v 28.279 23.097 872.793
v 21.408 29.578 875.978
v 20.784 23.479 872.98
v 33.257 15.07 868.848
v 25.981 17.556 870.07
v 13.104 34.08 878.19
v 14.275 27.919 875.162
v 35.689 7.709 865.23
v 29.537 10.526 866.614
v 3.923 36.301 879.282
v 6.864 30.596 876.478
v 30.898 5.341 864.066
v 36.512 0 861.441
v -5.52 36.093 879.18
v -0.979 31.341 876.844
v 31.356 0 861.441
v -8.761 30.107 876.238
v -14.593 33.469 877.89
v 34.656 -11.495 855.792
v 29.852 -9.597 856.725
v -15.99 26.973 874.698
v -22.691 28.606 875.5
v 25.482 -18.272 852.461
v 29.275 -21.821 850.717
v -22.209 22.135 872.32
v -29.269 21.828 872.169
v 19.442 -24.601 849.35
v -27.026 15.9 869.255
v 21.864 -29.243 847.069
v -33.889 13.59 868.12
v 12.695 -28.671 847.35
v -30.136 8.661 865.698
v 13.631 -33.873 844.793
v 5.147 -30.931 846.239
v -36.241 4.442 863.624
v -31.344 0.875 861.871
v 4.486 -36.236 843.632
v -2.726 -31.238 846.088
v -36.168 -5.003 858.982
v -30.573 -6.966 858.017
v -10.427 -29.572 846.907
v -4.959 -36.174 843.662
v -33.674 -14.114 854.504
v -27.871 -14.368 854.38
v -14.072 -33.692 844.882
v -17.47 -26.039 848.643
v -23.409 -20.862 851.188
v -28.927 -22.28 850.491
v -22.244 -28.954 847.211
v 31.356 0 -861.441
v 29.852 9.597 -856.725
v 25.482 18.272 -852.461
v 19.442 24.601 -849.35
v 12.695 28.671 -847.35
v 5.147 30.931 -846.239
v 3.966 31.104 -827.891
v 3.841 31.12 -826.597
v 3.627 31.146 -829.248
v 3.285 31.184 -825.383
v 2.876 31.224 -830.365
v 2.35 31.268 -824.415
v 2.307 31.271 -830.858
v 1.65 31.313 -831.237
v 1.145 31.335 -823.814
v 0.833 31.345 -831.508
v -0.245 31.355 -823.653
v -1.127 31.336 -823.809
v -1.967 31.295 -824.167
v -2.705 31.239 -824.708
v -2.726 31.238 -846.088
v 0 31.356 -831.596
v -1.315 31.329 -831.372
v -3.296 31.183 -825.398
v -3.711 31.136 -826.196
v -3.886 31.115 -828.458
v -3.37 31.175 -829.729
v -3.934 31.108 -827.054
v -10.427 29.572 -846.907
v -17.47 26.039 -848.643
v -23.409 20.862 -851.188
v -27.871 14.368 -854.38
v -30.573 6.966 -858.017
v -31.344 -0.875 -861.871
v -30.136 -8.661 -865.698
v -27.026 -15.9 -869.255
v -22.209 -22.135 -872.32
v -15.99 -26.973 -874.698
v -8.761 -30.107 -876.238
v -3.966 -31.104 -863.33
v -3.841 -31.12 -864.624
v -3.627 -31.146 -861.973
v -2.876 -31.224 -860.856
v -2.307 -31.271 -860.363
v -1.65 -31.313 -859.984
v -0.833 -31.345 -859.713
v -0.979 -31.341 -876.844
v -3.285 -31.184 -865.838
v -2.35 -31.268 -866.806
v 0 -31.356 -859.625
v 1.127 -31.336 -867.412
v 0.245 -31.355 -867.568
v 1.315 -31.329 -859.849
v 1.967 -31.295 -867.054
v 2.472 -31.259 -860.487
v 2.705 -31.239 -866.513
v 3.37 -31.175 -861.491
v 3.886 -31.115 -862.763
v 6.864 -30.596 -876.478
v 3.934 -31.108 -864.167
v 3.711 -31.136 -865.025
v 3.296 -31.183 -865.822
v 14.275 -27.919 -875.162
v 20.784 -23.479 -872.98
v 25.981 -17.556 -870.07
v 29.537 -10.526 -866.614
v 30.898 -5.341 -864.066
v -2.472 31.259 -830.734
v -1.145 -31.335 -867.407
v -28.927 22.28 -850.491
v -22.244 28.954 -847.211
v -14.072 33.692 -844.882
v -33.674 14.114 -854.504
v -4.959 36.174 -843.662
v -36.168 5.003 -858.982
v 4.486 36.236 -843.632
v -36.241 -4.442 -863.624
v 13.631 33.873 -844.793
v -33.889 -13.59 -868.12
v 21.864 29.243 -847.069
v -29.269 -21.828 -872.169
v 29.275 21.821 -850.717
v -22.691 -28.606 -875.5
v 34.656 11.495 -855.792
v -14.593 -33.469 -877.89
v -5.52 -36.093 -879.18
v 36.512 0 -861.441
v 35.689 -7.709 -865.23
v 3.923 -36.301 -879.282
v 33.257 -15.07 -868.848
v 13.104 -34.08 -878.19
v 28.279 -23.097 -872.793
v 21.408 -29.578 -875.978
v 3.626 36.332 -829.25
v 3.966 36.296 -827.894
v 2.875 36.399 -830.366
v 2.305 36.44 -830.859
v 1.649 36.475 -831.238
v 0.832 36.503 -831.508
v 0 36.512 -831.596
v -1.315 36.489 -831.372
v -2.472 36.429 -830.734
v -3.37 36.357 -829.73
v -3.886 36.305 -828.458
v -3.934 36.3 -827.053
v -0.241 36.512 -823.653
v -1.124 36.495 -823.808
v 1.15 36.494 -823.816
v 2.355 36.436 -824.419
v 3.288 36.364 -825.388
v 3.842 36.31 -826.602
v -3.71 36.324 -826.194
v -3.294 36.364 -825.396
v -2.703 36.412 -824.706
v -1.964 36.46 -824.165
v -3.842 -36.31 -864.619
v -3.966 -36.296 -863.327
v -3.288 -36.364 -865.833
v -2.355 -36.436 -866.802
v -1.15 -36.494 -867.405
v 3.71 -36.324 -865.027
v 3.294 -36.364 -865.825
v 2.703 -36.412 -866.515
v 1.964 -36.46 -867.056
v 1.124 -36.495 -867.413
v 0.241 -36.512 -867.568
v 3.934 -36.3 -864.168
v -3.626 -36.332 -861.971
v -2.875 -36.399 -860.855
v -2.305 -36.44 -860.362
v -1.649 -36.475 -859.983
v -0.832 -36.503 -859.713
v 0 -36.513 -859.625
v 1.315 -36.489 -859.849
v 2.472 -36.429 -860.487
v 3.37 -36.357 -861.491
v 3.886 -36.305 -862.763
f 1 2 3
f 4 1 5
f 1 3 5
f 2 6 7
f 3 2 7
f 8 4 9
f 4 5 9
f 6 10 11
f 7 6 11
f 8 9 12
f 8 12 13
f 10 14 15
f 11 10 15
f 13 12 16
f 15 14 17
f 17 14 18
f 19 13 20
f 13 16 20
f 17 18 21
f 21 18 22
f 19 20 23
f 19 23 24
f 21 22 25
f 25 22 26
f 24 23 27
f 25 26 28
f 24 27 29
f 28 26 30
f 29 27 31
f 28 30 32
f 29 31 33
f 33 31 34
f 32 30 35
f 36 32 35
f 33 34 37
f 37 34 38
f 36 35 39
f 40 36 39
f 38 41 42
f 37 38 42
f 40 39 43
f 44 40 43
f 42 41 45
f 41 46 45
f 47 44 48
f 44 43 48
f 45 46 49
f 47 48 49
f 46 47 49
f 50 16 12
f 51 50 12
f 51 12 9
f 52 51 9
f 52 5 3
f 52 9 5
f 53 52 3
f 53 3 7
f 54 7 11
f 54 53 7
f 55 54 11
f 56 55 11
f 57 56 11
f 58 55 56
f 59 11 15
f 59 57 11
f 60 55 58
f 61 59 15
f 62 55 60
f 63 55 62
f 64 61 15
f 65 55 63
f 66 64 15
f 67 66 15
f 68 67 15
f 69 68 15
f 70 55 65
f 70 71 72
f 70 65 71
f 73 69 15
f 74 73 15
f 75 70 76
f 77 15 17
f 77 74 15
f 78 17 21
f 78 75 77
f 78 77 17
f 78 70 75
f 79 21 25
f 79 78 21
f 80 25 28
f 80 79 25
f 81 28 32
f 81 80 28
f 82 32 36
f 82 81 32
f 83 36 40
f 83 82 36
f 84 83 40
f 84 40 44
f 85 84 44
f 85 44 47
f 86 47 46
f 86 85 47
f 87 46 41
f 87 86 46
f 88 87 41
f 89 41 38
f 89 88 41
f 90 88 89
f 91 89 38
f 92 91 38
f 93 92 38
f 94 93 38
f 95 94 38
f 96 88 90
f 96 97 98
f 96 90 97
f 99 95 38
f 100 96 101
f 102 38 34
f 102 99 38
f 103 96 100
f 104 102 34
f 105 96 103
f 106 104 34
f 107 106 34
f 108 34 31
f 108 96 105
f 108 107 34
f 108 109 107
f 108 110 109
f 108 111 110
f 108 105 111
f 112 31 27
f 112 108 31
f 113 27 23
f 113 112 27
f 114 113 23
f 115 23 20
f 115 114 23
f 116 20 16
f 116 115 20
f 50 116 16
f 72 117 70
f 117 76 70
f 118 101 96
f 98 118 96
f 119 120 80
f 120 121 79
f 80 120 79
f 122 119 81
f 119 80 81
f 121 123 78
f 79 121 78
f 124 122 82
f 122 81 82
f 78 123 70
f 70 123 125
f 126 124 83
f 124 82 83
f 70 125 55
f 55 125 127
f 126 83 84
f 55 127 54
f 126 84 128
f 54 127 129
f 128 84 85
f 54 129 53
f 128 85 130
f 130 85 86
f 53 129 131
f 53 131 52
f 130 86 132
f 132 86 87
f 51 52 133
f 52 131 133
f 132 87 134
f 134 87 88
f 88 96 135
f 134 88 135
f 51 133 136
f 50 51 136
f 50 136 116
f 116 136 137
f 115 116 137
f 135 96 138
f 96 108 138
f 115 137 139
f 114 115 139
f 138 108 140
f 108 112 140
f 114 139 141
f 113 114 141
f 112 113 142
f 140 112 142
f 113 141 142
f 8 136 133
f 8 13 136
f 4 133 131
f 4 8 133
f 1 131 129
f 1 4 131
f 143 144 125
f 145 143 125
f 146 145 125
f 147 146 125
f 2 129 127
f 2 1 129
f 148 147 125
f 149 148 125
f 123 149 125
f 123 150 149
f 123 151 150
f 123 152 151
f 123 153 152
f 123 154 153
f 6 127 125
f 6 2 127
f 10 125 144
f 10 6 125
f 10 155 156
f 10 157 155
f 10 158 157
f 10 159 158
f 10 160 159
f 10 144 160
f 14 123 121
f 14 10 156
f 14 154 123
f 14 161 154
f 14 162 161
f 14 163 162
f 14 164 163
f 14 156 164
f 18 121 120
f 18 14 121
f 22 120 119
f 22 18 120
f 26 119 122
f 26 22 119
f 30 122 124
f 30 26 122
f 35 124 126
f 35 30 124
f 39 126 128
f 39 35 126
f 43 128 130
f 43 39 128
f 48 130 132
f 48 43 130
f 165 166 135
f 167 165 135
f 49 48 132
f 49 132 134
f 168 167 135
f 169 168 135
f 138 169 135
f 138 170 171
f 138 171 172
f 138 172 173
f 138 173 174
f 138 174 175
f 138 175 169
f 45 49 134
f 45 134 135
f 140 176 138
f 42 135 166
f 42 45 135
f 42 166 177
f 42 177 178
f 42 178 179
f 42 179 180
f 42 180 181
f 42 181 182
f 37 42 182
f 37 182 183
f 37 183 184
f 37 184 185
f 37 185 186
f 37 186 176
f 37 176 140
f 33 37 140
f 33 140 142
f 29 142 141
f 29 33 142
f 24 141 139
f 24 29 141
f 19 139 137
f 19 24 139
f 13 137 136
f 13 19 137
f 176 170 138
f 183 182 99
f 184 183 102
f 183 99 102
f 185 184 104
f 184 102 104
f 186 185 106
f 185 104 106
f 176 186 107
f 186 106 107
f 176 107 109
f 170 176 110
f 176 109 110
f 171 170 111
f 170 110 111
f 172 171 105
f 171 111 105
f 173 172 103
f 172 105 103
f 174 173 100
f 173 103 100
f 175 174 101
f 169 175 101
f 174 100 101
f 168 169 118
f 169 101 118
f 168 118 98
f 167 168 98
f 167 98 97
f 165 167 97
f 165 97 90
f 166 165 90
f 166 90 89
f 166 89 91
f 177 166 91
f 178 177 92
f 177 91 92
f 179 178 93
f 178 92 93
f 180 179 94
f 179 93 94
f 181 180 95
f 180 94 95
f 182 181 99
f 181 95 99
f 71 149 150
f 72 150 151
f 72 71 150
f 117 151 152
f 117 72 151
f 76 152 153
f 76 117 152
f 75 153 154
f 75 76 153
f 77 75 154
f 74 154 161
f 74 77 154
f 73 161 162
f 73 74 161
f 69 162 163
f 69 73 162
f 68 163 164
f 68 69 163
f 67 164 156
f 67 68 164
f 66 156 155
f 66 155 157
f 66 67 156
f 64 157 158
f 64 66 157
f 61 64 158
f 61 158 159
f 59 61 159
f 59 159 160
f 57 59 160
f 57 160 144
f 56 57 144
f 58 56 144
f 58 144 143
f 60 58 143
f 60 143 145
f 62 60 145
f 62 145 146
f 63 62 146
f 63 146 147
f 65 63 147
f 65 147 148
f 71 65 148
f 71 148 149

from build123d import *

# Parameters (mm, degrees)
SKETCH1_R          = 36.5125
SKETCH1_R_2        = 31.3563
BASE_EXTRUDE_DEPTH = 914.4
CUT_EXTRUDE5_DEPTH = 76.2
SKETCH4_R          = 3.9751
CUT_EXTRUDE2_DEPTH = 63.5
SKETCH5_R          = 3.9751
CUT_EXTRUDE3_DEPTH = 881.900721082


with BuildPart() as part:
    # Sketch1 → Base-Extrude (new, symmetric)
    with BuildSketch(Plane.XY):
        Circle(SKETCH1_R)
        Circle(SKETCH1_R_2, mode=Mode.SUBTRACT)
    extrude(amount=BASE_EXTRUDE_DEPTH, both=True)

    # Sketch6 → Cut-Extrude5 (cut, symmetric)
    with BuildSketch(Plane(origin=(0, 0, 0), x_dir=(0, 0, -1), z_dir=(1, 0, 0))):
        Polygon((-956.15258377, 192.708539462), (-746.964120429, -232.924753088), (-956.15258377, -232.924753088), align=None)
        Polygon((766.72941623, 192.708539462), (975.917879571, -232.924753088), (975.917879571, 192.708539462), align=None)
    extrude(amount=CUT_EXTRUDE5_DEPTH, both=True, mode=Mode.SUBTRACT)

    # Sketch4 → Cut-Extrude2 (cut, symmetric)
    with BuildSketch(Plane(origin=(0, 0, 0), x_dir=(1, 0, 0), z_dir=(0, 1, 0))):
        with Locations((0, 863.6)):
            Circle(SKETCH4_R)
    extrude(amount=CUT_EXTRUDE2_DEPTH, both=True, mode=Mode.SUBTRACT)

    # Sketch5 → Cut-Extrude3 (cut, through all)
    with BuildSketch(Plane(origin=(0, 0, 0), x_dir=(1, 0, 0), z_dir=(0, 1, 0))):
        with Locations((0, 827.62098982)):
            Circle(SKETCH5_R)
    extrude(amount=CUT_EXTRUDE3_DEPTH, mode=Mode.SUBTRACT)


solid = part.part
